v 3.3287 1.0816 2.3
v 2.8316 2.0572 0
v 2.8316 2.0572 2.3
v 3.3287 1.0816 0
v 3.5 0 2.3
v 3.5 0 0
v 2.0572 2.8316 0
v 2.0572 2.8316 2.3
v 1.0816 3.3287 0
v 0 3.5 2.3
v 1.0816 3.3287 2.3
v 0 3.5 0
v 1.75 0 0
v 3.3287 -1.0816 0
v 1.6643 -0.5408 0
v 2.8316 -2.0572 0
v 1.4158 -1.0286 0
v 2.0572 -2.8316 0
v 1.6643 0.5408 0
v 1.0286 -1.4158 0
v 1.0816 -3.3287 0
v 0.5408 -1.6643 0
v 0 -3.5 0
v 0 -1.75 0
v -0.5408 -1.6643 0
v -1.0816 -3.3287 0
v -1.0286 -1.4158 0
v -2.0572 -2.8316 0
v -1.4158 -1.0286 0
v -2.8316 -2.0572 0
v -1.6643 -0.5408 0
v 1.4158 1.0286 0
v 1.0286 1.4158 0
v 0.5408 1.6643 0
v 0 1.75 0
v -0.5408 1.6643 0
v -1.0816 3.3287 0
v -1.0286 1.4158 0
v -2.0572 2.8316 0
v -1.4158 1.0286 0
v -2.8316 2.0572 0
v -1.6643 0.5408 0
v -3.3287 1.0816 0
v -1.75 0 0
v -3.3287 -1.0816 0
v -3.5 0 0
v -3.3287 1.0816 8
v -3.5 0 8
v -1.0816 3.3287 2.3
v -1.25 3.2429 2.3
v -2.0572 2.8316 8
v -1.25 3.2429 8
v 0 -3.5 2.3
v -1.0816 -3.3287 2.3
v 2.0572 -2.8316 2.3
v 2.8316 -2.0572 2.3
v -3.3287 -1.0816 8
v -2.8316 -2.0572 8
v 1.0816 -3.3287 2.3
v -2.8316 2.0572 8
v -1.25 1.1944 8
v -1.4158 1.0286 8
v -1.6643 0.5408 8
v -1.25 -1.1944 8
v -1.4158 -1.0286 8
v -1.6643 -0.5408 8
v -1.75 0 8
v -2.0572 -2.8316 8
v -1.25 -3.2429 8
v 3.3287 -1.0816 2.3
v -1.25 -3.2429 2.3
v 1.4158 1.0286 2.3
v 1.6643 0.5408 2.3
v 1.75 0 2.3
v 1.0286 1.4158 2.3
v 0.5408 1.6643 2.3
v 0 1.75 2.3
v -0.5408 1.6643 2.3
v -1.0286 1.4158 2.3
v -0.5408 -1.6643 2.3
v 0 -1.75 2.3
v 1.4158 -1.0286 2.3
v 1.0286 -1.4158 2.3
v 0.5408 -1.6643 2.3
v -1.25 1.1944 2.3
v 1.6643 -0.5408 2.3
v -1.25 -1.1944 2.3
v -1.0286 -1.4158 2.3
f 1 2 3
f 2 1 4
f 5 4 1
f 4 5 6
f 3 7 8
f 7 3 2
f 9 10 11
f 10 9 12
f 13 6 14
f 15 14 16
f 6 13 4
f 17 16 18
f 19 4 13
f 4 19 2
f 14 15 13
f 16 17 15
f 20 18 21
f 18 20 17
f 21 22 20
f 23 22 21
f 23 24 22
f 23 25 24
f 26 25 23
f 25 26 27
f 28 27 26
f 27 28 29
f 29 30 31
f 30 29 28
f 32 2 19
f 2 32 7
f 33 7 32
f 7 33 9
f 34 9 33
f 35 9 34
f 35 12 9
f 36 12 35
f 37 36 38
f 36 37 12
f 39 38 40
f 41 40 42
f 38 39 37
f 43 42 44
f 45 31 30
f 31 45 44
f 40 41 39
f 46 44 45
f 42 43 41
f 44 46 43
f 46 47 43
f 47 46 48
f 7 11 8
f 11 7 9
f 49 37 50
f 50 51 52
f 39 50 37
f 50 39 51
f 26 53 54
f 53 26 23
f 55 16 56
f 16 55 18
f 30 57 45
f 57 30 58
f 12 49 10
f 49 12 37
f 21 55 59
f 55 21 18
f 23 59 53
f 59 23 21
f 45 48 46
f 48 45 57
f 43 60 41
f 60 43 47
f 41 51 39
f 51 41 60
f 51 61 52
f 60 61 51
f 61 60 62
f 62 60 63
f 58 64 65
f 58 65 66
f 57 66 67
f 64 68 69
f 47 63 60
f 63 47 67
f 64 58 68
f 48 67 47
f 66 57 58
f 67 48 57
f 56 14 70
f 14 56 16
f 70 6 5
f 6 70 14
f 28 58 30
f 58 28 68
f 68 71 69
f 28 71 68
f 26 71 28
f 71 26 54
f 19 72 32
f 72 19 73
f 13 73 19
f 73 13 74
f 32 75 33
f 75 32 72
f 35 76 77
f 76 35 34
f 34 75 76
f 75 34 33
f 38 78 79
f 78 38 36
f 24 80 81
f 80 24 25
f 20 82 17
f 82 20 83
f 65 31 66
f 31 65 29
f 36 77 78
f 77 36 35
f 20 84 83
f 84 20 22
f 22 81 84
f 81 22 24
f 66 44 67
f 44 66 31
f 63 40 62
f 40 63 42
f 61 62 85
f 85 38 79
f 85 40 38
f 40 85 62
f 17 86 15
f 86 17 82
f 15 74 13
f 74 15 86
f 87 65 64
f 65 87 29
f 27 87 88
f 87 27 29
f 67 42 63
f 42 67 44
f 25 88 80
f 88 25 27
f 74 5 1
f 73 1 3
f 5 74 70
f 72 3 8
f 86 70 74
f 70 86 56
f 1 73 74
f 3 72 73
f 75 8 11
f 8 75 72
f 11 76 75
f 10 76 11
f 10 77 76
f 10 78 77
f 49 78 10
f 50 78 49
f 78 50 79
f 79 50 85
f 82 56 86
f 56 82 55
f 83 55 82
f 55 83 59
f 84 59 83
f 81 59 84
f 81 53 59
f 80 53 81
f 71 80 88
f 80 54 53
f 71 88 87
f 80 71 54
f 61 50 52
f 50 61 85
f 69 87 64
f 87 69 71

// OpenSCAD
difference(){
  color([0.3, 0.3, 0.3]) cylinder($fn = 20, r = 3.5, h = 8);
  translate([0, 0, -1]) color("grey") cylinder($fn = 20, r = 1.75, h = 8 + 2);
  translate([-1.25, -4, 2.3]) cube([6, 8, 6]);
}
